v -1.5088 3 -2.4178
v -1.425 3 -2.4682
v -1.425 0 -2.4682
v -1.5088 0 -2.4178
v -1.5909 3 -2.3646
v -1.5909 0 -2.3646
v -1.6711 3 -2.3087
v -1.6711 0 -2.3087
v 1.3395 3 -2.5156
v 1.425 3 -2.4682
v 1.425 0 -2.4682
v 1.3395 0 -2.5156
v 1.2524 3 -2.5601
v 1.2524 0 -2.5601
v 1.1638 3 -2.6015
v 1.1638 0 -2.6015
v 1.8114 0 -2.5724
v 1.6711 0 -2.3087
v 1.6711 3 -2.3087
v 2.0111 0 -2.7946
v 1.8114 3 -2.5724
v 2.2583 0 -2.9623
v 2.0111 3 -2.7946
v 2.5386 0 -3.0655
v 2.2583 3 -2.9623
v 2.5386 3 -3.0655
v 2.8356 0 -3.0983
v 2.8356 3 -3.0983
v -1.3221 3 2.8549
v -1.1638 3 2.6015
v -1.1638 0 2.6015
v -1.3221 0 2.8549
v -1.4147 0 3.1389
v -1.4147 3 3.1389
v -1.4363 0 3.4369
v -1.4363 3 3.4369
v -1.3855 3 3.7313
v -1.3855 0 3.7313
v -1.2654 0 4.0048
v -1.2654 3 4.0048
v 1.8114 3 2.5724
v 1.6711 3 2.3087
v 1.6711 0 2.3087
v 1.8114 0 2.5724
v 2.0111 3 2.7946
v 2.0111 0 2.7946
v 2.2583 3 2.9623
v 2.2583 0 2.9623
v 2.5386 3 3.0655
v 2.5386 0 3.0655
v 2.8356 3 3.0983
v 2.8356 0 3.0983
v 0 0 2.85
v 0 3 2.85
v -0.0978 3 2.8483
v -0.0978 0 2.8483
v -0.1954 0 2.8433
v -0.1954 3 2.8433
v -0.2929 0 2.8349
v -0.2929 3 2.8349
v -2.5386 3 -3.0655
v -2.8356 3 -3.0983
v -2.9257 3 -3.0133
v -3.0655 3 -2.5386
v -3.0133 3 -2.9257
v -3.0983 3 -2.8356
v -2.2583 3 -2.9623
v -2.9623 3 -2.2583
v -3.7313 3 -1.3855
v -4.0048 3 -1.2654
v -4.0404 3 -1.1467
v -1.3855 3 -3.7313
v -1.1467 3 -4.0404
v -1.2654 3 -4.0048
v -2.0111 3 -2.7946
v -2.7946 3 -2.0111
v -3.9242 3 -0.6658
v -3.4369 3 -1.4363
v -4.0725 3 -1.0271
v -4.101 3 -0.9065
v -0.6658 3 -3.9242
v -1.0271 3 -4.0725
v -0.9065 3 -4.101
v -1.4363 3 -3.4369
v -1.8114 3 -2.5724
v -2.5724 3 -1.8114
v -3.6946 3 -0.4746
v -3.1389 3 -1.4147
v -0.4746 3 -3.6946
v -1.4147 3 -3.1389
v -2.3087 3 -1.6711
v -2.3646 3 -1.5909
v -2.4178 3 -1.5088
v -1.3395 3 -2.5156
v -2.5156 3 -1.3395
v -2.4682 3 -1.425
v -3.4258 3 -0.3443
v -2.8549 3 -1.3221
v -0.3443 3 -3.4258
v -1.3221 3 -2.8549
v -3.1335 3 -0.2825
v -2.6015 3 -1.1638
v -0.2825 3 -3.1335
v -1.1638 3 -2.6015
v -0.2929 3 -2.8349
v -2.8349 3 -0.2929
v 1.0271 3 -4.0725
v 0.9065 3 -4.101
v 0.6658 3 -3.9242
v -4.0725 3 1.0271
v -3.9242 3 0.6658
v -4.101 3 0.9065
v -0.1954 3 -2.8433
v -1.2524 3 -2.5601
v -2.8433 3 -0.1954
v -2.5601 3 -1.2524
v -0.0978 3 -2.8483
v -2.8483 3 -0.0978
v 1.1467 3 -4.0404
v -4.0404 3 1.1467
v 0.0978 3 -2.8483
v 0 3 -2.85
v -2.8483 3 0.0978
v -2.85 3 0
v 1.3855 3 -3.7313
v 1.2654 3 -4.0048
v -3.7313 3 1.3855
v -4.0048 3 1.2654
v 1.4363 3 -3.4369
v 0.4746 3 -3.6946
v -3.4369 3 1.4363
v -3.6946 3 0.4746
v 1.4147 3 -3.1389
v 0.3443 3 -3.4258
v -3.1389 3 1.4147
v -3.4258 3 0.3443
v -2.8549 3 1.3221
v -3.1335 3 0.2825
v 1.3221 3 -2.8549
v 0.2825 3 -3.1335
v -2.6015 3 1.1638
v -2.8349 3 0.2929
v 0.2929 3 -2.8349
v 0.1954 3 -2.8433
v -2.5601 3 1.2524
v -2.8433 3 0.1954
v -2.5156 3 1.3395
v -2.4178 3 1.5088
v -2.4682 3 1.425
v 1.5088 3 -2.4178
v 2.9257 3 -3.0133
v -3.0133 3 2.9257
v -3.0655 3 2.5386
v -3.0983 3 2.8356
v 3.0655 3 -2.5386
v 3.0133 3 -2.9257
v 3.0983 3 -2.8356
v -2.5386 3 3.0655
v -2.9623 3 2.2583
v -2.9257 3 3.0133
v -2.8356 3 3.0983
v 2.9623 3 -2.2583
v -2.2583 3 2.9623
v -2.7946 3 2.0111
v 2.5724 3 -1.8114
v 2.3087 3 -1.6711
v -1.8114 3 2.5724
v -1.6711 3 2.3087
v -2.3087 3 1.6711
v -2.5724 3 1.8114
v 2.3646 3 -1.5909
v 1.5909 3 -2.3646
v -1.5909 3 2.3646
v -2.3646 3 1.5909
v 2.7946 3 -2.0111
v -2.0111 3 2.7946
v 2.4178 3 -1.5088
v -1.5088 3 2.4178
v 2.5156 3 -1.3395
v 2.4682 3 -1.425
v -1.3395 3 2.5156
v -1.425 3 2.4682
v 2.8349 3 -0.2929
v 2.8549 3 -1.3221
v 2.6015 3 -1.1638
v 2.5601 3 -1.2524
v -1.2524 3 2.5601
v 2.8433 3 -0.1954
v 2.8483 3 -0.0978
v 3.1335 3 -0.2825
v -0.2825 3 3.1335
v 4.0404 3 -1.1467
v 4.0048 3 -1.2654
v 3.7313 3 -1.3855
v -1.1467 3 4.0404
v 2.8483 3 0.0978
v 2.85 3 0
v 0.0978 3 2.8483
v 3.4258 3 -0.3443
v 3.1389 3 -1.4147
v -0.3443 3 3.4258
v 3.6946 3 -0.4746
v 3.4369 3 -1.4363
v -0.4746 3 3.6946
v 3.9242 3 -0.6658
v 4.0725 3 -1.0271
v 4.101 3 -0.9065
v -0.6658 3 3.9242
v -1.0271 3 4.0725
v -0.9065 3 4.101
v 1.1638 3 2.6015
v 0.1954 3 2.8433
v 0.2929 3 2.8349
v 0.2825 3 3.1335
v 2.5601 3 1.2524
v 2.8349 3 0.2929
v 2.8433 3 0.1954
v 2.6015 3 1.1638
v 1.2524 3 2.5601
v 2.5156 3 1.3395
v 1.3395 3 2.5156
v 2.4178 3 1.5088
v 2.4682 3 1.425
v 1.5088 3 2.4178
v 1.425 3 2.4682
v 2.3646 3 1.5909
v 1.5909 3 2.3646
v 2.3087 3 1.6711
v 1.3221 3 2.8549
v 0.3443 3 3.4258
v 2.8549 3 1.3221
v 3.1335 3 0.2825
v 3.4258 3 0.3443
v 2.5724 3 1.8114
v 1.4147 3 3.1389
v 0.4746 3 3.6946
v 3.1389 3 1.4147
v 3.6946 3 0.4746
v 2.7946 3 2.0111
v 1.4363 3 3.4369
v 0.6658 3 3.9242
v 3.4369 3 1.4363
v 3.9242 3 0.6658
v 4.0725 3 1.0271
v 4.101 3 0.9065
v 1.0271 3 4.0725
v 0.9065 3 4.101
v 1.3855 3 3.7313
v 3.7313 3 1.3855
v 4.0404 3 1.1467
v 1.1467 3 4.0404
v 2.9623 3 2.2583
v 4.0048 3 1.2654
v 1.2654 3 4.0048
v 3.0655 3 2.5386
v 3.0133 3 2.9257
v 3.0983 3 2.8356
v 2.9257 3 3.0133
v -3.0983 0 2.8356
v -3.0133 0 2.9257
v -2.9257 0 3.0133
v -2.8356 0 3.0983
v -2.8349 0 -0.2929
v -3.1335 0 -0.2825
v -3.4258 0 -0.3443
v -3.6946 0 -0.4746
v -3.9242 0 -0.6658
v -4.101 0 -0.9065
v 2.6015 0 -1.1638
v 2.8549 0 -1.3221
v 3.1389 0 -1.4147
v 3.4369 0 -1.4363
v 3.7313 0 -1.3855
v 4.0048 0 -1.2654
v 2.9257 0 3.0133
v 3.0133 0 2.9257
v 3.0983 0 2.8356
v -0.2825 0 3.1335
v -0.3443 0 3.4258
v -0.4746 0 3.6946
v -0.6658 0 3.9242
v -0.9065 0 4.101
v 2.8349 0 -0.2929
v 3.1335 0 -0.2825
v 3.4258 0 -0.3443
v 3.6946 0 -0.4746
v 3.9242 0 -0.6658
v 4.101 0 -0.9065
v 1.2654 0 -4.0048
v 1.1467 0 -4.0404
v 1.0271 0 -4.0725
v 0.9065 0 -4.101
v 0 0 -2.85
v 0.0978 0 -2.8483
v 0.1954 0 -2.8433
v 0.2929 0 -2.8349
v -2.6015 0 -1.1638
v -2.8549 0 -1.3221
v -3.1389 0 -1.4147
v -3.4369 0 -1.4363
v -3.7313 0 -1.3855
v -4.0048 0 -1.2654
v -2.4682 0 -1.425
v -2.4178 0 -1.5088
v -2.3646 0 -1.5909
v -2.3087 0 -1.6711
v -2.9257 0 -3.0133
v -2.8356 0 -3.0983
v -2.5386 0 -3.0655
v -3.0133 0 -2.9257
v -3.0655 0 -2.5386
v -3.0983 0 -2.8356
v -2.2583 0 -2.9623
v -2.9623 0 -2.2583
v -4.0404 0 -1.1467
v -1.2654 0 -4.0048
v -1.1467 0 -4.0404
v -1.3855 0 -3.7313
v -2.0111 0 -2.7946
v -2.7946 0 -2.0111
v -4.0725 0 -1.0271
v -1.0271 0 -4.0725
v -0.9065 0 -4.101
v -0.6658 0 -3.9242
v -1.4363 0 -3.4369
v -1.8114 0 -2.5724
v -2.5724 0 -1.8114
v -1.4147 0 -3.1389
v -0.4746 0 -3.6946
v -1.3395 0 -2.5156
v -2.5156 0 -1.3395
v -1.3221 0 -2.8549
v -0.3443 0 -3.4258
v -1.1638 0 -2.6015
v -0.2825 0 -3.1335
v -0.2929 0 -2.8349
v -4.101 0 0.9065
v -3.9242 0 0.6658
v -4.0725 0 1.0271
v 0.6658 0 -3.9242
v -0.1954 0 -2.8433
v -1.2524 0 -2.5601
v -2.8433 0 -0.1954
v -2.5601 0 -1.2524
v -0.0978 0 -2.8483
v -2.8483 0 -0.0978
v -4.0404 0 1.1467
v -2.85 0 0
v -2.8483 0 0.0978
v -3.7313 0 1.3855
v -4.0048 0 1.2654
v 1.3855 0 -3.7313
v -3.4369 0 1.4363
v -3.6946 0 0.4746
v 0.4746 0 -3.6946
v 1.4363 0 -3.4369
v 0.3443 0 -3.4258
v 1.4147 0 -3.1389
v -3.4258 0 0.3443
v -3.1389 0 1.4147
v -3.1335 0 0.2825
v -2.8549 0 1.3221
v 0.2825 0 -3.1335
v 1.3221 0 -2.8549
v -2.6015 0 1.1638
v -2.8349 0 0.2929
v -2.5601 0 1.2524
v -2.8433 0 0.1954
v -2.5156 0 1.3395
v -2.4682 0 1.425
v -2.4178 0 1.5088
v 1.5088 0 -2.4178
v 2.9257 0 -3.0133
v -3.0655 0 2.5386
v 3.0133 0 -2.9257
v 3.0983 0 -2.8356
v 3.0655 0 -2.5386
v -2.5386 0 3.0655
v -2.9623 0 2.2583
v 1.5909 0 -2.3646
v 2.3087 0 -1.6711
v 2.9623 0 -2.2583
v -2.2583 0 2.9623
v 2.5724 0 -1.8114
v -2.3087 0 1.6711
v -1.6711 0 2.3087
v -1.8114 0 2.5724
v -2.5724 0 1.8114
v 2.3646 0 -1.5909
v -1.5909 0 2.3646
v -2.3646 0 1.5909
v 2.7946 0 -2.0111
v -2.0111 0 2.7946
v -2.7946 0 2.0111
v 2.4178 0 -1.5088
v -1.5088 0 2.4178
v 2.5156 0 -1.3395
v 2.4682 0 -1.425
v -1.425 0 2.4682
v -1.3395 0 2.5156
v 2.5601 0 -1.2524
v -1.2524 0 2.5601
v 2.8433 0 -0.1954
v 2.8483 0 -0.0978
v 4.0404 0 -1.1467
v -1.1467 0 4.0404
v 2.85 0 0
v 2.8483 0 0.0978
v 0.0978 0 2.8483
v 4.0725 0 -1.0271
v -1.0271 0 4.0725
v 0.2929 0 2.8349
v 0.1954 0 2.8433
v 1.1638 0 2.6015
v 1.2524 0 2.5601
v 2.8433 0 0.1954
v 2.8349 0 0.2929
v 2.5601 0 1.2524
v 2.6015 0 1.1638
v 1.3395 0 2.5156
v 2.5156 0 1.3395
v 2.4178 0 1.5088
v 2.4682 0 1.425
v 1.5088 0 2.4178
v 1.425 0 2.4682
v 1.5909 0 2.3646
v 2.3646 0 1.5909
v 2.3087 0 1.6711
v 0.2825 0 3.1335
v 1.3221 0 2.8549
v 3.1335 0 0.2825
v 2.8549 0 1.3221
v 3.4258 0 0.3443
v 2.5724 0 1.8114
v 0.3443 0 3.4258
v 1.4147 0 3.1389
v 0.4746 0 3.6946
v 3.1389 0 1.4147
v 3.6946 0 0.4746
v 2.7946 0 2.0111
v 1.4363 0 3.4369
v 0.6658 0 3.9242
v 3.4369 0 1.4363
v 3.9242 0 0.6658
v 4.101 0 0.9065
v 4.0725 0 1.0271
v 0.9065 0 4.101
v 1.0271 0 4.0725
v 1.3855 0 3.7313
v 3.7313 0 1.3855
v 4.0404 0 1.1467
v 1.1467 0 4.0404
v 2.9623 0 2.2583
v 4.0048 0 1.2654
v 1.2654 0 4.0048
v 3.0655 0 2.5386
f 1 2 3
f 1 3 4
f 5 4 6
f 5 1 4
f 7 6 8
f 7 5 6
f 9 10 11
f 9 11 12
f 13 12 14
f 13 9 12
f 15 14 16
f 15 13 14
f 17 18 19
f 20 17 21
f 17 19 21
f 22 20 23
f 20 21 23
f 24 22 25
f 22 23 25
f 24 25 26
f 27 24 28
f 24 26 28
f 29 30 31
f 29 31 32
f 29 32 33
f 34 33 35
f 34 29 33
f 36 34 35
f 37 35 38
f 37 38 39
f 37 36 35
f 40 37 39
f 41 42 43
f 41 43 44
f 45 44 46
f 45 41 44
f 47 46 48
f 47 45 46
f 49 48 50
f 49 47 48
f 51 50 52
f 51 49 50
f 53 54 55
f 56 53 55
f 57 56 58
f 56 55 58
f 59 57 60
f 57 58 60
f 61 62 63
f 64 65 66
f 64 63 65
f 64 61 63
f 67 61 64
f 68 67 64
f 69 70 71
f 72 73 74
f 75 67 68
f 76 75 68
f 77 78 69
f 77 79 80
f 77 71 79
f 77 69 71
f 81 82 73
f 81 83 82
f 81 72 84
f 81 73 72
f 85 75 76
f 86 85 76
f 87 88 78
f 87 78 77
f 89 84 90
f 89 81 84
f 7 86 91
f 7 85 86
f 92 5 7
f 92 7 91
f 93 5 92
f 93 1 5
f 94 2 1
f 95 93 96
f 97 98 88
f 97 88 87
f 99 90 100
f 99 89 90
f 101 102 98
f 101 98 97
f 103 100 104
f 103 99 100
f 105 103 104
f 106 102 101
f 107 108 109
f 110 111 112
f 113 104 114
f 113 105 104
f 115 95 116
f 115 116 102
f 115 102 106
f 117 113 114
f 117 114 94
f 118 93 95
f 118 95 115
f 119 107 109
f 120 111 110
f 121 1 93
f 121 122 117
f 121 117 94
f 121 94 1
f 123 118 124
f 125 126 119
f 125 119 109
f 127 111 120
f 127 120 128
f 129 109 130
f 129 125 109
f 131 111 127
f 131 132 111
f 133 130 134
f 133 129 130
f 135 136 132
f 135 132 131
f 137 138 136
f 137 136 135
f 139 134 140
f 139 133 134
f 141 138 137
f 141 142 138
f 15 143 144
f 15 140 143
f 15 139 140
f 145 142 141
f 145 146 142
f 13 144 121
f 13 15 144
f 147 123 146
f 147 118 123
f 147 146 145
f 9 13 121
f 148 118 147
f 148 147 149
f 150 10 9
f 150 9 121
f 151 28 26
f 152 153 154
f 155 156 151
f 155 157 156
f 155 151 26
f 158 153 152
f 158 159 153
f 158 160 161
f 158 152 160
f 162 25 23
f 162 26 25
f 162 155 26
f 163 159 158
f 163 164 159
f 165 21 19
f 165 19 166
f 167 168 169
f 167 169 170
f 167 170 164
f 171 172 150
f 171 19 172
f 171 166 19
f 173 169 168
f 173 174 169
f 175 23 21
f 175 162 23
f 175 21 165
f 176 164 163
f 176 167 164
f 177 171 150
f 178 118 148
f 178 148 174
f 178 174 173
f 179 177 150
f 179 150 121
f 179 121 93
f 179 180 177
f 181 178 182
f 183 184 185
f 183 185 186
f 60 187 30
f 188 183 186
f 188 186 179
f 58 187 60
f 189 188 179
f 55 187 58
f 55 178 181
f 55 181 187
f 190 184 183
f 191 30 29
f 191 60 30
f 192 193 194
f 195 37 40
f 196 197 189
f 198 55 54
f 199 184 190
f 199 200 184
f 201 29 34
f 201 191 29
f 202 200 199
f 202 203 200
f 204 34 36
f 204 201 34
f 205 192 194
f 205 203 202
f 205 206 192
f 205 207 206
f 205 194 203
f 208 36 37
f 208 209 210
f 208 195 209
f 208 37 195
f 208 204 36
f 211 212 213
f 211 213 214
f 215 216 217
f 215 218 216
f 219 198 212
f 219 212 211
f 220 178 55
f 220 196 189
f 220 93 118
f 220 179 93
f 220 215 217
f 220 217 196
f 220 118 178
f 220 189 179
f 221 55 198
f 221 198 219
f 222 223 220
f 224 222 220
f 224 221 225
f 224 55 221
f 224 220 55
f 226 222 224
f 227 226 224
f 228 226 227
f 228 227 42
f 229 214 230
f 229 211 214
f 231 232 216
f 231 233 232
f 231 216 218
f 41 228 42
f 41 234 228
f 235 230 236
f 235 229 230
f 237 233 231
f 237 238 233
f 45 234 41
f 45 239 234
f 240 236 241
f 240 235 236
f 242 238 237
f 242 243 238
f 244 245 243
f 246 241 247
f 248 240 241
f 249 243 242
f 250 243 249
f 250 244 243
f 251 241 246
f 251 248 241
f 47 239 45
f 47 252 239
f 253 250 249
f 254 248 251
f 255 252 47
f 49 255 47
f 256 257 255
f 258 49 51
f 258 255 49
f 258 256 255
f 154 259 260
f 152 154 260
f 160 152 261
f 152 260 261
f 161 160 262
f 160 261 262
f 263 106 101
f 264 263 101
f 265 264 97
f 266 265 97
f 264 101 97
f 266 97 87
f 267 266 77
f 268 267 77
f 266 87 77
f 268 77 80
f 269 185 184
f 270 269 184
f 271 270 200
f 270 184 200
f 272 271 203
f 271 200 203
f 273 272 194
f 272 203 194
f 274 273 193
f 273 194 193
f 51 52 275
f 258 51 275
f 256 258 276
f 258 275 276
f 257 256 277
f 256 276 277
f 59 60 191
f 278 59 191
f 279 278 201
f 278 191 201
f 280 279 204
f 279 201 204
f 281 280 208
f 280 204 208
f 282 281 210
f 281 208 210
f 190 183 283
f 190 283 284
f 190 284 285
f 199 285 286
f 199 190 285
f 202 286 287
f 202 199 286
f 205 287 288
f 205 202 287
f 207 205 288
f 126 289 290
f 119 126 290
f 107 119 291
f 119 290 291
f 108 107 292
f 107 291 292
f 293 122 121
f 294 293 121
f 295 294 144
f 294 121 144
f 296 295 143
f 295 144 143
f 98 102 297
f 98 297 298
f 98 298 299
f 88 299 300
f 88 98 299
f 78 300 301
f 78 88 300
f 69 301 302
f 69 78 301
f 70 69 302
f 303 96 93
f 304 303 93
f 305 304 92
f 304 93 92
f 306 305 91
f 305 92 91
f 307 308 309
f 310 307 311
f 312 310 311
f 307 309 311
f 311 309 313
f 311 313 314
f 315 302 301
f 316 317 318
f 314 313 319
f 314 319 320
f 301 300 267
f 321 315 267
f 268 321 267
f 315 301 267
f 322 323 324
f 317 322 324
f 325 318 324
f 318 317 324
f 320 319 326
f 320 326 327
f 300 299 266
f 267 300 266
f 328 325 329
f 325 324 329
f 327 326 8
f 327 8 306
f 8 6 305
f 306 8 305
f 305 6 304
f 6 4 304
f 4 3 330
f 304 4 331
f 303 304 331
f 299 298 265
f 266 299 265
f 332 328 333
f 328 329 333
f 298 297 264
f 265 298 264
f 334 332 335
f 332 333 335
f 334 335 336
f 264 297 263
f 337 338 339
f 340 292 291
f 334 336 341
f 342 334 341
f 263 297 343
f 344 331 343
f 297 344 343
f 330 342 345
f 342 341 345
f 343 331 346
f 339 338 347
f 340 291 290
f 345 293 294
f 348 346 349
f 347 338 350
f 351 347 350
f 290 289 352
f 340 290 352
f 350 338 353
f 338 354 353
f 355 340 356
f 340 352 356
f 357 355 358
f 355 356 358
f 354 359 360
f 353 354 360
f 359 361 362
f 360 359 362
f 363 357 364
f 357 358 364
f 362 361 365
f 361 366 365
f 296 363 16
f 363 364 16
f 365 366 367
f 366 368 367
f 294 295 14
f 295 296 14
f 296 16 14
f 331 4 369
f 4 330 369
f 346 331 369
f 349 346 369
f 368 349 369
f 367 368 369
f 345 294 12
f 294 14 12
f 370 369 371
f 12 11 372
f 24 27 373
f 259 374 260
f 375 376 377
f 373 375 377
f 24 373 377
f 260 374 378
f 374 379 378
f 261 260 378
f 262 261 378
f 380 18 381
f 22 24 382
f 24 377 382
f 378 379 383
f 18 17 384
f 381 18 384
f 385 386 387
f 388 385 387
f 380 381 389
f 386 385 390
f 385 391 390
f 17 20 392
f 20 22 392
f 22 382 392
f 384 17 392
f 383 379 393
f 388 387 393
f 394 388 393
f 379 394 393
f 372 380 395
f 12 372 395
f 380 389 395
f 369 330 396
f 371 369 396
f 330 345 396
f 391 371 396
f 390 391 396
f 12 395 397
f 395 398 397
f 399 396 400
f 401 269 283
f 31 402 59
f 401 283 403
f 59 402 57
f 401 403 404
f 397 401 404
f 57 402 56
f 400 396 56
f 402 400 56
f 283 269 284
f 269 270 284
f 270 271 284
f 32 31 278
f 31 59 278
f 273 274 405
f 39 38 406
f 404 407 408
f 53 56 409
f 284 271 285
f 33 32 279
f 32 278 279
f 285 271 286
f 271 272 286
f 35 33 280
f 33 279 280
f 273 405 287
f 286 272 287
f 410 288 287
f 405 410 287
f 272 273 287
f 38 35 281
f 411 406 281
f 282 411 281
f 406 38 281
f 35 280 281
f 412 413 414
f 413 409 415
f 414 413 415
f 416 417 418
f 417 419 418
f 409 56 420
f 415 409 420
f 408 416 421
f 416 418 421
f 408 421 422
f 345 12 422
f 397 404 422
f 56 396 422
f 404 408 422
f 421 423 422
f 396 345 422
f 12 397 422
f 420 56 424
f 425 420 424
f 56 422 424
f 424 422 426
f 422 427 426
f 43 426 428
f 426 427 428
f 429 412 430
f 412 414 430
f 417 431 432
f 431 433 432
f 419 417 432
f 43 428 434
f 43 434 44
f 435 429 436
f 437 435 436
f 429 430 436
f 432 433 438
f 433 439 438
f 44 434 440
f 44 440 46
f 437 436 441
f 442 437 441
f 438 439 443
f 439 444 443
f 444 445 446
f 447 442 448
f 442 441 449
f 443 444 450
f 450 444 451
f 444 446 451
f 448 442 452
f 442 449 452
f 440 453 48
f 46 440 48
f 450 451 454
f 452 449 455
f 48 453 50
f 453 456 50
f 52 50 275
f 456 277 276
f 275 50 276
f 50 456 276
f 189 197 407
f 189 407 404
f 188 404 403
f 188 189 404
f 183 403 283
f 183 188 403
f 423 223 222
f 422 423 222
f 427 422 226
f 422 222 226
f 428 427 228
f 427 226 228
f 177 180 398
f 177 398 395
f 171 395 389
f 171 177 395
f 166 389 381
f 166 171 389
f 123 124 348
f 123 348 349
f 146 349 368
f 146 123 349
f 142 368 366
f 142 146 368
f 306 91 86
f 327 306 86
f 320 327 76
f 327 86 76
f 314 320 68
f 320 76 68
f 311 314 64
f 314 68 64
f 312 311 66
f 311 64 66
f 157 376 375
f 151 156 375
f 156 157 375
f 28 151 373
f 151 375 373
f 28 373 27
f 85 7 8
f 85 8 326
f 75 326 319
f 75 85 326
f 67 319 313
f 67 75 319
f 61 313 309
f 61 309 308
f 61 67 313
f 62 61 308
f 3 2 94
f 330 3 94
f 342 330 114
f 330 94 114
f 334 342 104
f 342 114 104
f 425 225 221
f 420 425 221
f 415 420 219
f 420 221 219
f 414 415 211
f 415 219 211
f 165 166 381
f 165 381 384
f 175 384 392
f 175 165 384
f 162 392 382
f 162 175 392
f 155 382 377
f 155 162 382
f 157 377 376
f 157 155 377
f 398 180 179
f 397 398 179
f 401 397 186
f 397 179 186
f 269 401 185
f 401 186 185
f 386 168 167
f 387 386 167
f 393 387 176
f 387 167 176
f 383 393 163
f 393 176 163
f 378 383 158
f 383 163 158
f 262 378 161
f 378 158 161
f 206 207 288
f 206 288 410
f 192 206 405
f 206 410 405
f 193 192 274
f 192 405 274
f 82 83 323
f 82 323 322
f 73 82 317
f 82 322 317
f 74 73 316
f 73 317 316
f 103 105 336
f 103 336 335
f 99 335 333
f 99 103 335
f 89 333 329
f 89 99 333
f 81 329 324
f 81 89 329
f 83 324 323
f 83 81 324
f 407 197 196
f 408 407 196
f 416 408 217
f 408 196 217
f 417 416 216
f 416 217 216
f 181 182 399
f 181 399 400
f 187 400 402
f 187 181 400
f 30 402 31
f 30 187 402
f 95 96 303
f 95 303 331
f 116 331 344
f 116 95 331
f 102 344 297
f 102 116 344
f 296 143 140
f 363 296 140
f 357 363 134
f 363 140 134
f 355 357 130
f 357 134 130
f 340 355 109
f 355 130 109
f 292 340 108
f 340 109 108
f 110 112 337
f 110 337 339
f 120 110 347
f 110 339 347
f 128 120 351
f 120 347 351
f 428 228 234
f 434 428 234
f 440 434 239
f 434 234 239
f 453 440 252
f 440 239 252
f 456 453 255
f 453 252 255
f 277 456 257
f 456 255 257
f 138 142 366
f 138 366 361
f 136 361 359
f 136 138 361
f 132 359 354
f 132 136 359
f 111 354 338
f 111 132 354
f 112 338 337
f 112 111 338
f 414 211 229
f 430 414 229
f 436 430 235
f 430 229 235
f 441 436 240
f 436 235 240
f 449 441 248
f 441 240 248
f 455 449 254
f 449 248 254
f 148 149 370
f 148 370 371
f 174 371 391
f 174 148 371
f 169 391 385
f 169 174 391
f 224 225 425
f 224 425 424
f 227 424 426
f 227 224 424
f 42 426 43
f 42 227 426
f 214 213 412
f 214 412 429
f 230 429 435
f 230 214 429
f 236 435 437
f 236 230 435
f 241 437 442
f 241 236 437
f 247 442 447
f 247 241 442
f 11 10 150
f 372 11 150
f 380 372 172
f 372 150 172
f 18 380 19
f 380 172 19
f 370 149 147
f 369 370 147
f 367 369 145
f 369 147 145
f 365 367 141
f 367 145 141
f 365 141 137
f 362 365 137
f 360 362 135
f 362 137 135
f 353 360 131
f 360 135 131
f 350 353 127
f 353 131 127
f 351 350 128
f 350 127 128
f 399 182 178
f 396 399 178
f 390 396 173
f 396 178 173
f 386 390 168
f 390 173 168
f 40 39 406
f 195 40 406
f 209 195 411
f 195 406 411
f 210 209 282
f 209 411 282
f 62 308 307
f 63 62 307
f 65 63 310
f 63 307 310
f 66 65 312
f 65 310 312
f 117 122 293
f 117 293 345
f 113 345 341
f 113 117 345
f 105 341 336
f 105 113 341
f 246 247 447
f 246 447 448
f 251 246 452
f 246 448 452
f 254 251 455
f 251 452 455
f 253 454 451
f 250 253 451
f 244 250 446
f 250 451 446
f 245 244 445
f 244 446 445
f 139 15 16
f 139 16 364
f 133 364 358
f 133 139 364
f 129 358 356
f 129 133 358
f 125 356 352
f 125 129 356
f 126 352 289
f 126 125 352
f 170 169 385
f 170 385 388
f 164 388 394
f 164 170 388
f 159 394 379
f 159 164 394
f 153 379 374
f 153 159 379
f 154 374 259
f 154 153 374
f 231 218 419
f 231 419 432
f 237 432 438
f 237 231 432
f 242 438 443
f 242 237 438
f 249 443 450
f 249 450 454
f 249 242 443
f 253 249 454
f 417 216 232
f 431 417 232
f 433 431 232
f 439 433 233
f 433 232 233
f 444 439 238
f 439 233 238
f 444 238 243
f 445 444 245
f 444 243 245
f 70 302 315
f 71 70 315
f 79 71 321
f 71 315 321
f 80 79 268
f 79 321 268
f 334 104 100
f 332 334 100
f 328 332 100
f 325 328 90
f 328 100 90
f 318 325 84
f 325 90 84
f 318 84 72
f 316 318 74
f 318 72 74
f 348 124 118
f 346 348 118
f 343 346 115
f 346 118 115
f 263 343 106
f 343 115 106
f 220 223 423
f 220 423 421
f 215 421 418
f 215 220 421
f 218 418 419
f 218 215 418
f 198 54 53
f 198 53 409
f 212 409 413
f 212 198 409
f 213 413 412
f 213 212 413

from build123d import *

# Parameters (mm, degrees)
SKETCH1_R                 = 4.2
BOSS_EXTRUDE1_DEPTH       = 3
CUT_EXTRUDE2_DEPTH        = 3
CIRPATTERN1_COUNT         = 12
CIRPATTERN1_COPY_1_DEPTH  = 3
CIRPATTERN1_COPY_2_DEPTH  = 3
CIRPATTERN1_COPY_3_DEPTH  = 3
CIRPATTERN1_COPY_4_DEPTH  = 3
CIRPATTERN1_COPY_5_DEPTH  = 3
CIRPATTERN1_COPY_6_DEPTH  = 3
CIRPATTERN1_COPY_7_DEPTH  = 3
CIRPATTERN1_COPY_8_DEPTH  = 3
CIRPATTERN1_COPY_9_DEPTH  = 3
CIRPATTERN1_COPY_10_DEPTH = 3
CIRPATTERN1_COPY_11_DEPTH = 3


with BuildPart() as part:
    # Sketch1 → Boss-Extrude1 (new body)
    with BuildSketch(Plane(origin=(0, 0, 0), x_dir=(1, 0, 0), z_dir=(0, 1, 0))):
        with Locations(Location((0, 0, 0), (0, 0, 270))):
            Circle(SKETCH1_R)
    extrude(amount=BOSS_EXTRUDE1_DEPTH)

    # Sketch2 → Cut-Extrude2 (cut)
    with BuildSketch(Plane(origin=(0, 3, 0), x_dir=(1, 0, 0), z_dir=(0, 1, 0))):
        with BuildLine():
            Line((-1.108658308, 4.191722636), (0, 5.977827248))
            Line((0, 5.977827248), (0, 2.85))
            ThreePointArc((0, 2.85), (-0.146635628, 2.846225218), (-0.292882823, 2.834910872))
            ThreePointArc((-0.292882823, 2.834910872), (-0.454077223, 3.661639746), (-1.108658308, 4.191722636))
        make_face()
    cut_extrude2 = extrude(amount=-CUT_EXTRUDE2_DEPTH, mode=Mode.SUBTRACT)

    # Mirror2: Cut-Extrude2 across plane
    add(cut_extrude2.mirror(Plane.ZY), mode=Mode.SUBTRACT)

    # CirPattern1: Cut-Extrude2 ×12 about axis
    cirpattern1_axis = Axis((0, 0, 0), (0, 1, 0))
    for i in range(1, CIRPATTERN1_COUNT):
        add(cut_extrude2.rotate(cirpattern1_axis, i * 360 / CIRPATTERN1_COUNT), mode=Mode.SUBTRACT)

    # CirPattern1 copy 1 sketch → CirPattern1 copy 1 (cut)
    with BuildSketch(Plane(origin=(0, 3, 0), x_dir=(-0.8660254037844387, 0, 0.49999999999999994), z_dir=(0, 1, 0))):
        with BuildLine():
            Line((-1.108658308, -4.191722636), (0, -5.977827248))
            Line((0, -5.977827248), (0, -2.85))
            ThreePointArc((0, -2.85), (-0.146635628, -2.846225218), (-0.292882823, -2.834910872))
            ThreePointArc((-0.292882823, -2.834910872), (-0.454077223, -3.661639746), (-1.108658308, -4.191722636))
        make_face()
    extrude(amount=-CIRPATTERN1_COPY_1_DEPTH, mode=Mode.SUBTRACT)

    # CirPattern1 copy 2 sketch → CirPattern1 copy 2 (cut)
    with BuildSketch(Plane(origin=(0, 3, 0), x_dir=(-0.5000000000000001, 0, 0.8660254037844386), z_dir=(0, 1, 0))):
        with BuildLine():
            Line((-1.108658308, -4.191722636), (0, -5.977827248))
            Line((0, -5.977827248), (0, -2.85))
            ThreePointArc((0, -2.85), (-0.146635628, -2.846225218), (-0.292882823, -2.834910872))
            ThreePointArc((-0.292882823, -2.834910872), (-0.454077223, -3.661639746), (-1.108658308, -4.191722636))
        make_face()
    extrude(amount=-CIRPATTERN1_COPY_2_DEPTH, mode=Mode.SUBTRACT)

    # CirPattern1 copy 3 sketch → CirPattern1 copy 3 (cut)
    with BuildSketch(Plane.ZX.offset(3)):
        with BuildLine():
            Line((-1.108658308, -4.191722636), (0, -5.977827248))
            Line((0, -5.977827248), (0, -2.85))
            ThreePointArc((0, -2.85), (-0.146635628, -2.846225218), (-0.292882823, -2.834910872))
            ThreePointArc((-0.292882823, -2.834910872), (-0.454077223, -3.661639746), (-1.108658308, -4.191722636))
        make_face()
    extrude(amount=-CIRPATTERN1_COPY_3_DEPTH, mode=Mode.SUBTRACT)

    # CirPattern1 copy 4 sketch → CirPattern1 copy 4 (cut)
    with BuildSketch(Plane(origin=(0, 3, 0), x_dir=(0.4999999999999998, 0, 0.8660254037844387), z_dir=(0, 1, 0))):
        with BuildLine():
            Line((-1.108658308, -4.191722636), (0, -5.977827248))
            Line((0, -5.977827248), (0, -2.85))
            ThreePointArc((0, -2.85), (-0.146635628, -2.846225218), (-0.292882823, -2.834910872))
            ThreePointArc((-0.292882823, -2.834910872), (-0.454077223, -3.661639746), (-1.108658308, -4.191722636))
        make_face()
    extrude(amount=-CIRPATTERN1_COPY_4_DEPTH, mode=Mode.SUBTRACT)

    # CirPattern1 copy 5 sketch → CirPattern1 copy 5 (cut)
    with BuildSketch(Plane(origin=(0, 3, 0), x_dir=(0.8660254037844387, 0, 0.49999999999999994), z_dir=(0, 1, 0))):
        with BuildLine():
            Line((-1.108658308, -4.191722636), (0, -5.977827248))
            Line((0, -5.977827248), (0, -2.85))
            ThreePointArc((0, -2.85), (-0.146635628, -2.846225218), (-0.292882823, -2.834910872))
            ThreePointArc((-0.292882823, -2.834910872), (-0.454077223, -3.661639746), (-1.108658308, -4.191722636))
        make_face()
    extrude(amount=-CIRPATTERN1_COPY_5_DEPTH, mode=Mode.SUBTRACT)

    # CirPattern1 copy 6 sketch → CirPattern1 copy 6 (cut)
    with BuildSketch(Plane(origin=(0, 3, 0), x_dir=(1, 0, 0), z_dir=(0, 1, 0))):
        with BuildLine():
            Line((-1.108658308, -4.191722636), (0, -5.977827248))
            Line((0, -5.977827248), (0, -2.85))
            ThreePointArc((0, -2.85), (-0.146635628, -2.846225218), (-0.292882823, -2.834910872))
            ThreePointArc((-0.292882823, -2.834910872), (-0.454077223, -3.661639746), (-1.108658308, -4.191722636))
        make_face()
    extrude(amount=-CIRPATTERN1_COPY_6_DEPTH, mode=Mode.SUBTRACT)

    # CirPattern1 copy 7 sketch → CirPattern1 copy 7 (cut)
    with BuildSketch(Plane(origin=(0, 3, 0), x_dir=(0.8660254037844386, 0, -0.5000000000000001), z_dir=(0, 1, 0))):
        with BuildLine():
            Line((-1.108658308, -4.191722636), (0, -5.977827248))
            Line((0, -5.977827248), (0, -2.85))
            ThreePointArc((0, -2.85), (-0.146635628, -2.846225218), (-0.292882823, -2.834910872))
            ThreePointArc((-0.292882823, -2.834910872), (-0.454077223, -3.661639746), (-1.108658308, -4.191722636))
        make_face()
    extrude(amount=-CIRPATTERN1_COPY_7_DEPTH, mode=Mode.SUBTRACT)

    # CirPattern1 copy 8 sketch → CirPattern1 copy 8 (cut)
    with BuildSketch(Plane(origin=(0, 3, 0), x_dir=(0.5000000000000004, 0, -0.8660254037844384), z_dir=(0, 1, 0))):
        with BuildLine():
            Line((-1.108658308, -4.191722636), (0, -5.977827248))
            Line((0, -5.977827248), (0, -2.85))
            ThreePointArc((0, -2.85), (-0.146635628, -2.846225218), (-0.292882823, -2.834910872))
            ThreePointArc((-0.292882823, -2.834910872), (-0.454077223, -3.661639746), (-1.108658308, -4.191722636))
        make_face()
    extrude(amount=-CIRPATTERN1_COPY_8_DEPTH, mode=Mode.SUBTRACT)

    # CirPattern1 copy 9 sketch → CirPattern1 copy 9 (cut)
    with BuildSketch(Plane(origin=(0, 3, 0), x_dir=(0, 0, -1), z_dir=(0, 1, 0))):
        with BuildLine():
            Line((-1.108658308, -4.191722636), (0, -5.977827248))
            Line((0, -5.977827248), (0, -2.85))
            ThreePointArc((0, -2.85), (-0.146635628, -2.846225218), (-0.292882823, -2.834910872))
            ThreePointArc((-0.292882823, -2.834910872), (-0.454077223, -3.661639746), (-1.108658308, -4.191722636))
        make_face()
    extrude(amount=-CIRPATTERN1_COPY_9_DEPTH, mode=Mode.SUBTRACT)

    # CirPattern1 copy 10 sketch → CirPattern1 copy 10 (cut)
    with BuildSketch(Plane(origin=(0, 3, 0), x_dir=(-0.5000000000000001, 0, -0.8660254037844386), z_dir=(0, 1, 0))):
        with BuildLine():
            Line((-1.108658308, -4.191722636), (0, -5.977827248))
            Line((0, -5.977827248), (0, -2.85))
            ThreePointArc((0, -2.85), (-0.146635628, -2.846225218), (-0.292882823, -2.834910872))
            ThreePointArc((-0.292882823, -2.834910872), (-0.454077223, -3.661639746), (-1.108658308, -4.191722636))
        make_face()
    extrude(amount=-CIRPATTERN1_COPY_10_DEPTH, mode=Mode.SUBTRACT)

    # CirPattern1 copy 11 sketch → CirPattern1 copy 11 (cut)
    with BuildSketch(Plane(origin=(0, 3, 0), x_dir=(-0.8660254037844384, 0, -0.5000000000000004), z_dir=(0, 1, 0))):
        with BuildLine():
            Line((-1.108658308, -4.191722636), (0, -5.977827248))
            Line((0, -5.977827248), (0, -2.85))
            ThreePointArc((0, -2.85), (-0.146635628, -2.846225218), (-0.292882823, -2.834910872))
            ThreePointArc((-0.292882823, -2.834910872), (-0.454077223, -3.661639746), (-1.108658308, -4.191722636))
        make_face()
    extrude(amount=-CIRPATTERN1_COPY_11_DEPTH, mode=Mode.SUBTRACT)


solid = part.part
